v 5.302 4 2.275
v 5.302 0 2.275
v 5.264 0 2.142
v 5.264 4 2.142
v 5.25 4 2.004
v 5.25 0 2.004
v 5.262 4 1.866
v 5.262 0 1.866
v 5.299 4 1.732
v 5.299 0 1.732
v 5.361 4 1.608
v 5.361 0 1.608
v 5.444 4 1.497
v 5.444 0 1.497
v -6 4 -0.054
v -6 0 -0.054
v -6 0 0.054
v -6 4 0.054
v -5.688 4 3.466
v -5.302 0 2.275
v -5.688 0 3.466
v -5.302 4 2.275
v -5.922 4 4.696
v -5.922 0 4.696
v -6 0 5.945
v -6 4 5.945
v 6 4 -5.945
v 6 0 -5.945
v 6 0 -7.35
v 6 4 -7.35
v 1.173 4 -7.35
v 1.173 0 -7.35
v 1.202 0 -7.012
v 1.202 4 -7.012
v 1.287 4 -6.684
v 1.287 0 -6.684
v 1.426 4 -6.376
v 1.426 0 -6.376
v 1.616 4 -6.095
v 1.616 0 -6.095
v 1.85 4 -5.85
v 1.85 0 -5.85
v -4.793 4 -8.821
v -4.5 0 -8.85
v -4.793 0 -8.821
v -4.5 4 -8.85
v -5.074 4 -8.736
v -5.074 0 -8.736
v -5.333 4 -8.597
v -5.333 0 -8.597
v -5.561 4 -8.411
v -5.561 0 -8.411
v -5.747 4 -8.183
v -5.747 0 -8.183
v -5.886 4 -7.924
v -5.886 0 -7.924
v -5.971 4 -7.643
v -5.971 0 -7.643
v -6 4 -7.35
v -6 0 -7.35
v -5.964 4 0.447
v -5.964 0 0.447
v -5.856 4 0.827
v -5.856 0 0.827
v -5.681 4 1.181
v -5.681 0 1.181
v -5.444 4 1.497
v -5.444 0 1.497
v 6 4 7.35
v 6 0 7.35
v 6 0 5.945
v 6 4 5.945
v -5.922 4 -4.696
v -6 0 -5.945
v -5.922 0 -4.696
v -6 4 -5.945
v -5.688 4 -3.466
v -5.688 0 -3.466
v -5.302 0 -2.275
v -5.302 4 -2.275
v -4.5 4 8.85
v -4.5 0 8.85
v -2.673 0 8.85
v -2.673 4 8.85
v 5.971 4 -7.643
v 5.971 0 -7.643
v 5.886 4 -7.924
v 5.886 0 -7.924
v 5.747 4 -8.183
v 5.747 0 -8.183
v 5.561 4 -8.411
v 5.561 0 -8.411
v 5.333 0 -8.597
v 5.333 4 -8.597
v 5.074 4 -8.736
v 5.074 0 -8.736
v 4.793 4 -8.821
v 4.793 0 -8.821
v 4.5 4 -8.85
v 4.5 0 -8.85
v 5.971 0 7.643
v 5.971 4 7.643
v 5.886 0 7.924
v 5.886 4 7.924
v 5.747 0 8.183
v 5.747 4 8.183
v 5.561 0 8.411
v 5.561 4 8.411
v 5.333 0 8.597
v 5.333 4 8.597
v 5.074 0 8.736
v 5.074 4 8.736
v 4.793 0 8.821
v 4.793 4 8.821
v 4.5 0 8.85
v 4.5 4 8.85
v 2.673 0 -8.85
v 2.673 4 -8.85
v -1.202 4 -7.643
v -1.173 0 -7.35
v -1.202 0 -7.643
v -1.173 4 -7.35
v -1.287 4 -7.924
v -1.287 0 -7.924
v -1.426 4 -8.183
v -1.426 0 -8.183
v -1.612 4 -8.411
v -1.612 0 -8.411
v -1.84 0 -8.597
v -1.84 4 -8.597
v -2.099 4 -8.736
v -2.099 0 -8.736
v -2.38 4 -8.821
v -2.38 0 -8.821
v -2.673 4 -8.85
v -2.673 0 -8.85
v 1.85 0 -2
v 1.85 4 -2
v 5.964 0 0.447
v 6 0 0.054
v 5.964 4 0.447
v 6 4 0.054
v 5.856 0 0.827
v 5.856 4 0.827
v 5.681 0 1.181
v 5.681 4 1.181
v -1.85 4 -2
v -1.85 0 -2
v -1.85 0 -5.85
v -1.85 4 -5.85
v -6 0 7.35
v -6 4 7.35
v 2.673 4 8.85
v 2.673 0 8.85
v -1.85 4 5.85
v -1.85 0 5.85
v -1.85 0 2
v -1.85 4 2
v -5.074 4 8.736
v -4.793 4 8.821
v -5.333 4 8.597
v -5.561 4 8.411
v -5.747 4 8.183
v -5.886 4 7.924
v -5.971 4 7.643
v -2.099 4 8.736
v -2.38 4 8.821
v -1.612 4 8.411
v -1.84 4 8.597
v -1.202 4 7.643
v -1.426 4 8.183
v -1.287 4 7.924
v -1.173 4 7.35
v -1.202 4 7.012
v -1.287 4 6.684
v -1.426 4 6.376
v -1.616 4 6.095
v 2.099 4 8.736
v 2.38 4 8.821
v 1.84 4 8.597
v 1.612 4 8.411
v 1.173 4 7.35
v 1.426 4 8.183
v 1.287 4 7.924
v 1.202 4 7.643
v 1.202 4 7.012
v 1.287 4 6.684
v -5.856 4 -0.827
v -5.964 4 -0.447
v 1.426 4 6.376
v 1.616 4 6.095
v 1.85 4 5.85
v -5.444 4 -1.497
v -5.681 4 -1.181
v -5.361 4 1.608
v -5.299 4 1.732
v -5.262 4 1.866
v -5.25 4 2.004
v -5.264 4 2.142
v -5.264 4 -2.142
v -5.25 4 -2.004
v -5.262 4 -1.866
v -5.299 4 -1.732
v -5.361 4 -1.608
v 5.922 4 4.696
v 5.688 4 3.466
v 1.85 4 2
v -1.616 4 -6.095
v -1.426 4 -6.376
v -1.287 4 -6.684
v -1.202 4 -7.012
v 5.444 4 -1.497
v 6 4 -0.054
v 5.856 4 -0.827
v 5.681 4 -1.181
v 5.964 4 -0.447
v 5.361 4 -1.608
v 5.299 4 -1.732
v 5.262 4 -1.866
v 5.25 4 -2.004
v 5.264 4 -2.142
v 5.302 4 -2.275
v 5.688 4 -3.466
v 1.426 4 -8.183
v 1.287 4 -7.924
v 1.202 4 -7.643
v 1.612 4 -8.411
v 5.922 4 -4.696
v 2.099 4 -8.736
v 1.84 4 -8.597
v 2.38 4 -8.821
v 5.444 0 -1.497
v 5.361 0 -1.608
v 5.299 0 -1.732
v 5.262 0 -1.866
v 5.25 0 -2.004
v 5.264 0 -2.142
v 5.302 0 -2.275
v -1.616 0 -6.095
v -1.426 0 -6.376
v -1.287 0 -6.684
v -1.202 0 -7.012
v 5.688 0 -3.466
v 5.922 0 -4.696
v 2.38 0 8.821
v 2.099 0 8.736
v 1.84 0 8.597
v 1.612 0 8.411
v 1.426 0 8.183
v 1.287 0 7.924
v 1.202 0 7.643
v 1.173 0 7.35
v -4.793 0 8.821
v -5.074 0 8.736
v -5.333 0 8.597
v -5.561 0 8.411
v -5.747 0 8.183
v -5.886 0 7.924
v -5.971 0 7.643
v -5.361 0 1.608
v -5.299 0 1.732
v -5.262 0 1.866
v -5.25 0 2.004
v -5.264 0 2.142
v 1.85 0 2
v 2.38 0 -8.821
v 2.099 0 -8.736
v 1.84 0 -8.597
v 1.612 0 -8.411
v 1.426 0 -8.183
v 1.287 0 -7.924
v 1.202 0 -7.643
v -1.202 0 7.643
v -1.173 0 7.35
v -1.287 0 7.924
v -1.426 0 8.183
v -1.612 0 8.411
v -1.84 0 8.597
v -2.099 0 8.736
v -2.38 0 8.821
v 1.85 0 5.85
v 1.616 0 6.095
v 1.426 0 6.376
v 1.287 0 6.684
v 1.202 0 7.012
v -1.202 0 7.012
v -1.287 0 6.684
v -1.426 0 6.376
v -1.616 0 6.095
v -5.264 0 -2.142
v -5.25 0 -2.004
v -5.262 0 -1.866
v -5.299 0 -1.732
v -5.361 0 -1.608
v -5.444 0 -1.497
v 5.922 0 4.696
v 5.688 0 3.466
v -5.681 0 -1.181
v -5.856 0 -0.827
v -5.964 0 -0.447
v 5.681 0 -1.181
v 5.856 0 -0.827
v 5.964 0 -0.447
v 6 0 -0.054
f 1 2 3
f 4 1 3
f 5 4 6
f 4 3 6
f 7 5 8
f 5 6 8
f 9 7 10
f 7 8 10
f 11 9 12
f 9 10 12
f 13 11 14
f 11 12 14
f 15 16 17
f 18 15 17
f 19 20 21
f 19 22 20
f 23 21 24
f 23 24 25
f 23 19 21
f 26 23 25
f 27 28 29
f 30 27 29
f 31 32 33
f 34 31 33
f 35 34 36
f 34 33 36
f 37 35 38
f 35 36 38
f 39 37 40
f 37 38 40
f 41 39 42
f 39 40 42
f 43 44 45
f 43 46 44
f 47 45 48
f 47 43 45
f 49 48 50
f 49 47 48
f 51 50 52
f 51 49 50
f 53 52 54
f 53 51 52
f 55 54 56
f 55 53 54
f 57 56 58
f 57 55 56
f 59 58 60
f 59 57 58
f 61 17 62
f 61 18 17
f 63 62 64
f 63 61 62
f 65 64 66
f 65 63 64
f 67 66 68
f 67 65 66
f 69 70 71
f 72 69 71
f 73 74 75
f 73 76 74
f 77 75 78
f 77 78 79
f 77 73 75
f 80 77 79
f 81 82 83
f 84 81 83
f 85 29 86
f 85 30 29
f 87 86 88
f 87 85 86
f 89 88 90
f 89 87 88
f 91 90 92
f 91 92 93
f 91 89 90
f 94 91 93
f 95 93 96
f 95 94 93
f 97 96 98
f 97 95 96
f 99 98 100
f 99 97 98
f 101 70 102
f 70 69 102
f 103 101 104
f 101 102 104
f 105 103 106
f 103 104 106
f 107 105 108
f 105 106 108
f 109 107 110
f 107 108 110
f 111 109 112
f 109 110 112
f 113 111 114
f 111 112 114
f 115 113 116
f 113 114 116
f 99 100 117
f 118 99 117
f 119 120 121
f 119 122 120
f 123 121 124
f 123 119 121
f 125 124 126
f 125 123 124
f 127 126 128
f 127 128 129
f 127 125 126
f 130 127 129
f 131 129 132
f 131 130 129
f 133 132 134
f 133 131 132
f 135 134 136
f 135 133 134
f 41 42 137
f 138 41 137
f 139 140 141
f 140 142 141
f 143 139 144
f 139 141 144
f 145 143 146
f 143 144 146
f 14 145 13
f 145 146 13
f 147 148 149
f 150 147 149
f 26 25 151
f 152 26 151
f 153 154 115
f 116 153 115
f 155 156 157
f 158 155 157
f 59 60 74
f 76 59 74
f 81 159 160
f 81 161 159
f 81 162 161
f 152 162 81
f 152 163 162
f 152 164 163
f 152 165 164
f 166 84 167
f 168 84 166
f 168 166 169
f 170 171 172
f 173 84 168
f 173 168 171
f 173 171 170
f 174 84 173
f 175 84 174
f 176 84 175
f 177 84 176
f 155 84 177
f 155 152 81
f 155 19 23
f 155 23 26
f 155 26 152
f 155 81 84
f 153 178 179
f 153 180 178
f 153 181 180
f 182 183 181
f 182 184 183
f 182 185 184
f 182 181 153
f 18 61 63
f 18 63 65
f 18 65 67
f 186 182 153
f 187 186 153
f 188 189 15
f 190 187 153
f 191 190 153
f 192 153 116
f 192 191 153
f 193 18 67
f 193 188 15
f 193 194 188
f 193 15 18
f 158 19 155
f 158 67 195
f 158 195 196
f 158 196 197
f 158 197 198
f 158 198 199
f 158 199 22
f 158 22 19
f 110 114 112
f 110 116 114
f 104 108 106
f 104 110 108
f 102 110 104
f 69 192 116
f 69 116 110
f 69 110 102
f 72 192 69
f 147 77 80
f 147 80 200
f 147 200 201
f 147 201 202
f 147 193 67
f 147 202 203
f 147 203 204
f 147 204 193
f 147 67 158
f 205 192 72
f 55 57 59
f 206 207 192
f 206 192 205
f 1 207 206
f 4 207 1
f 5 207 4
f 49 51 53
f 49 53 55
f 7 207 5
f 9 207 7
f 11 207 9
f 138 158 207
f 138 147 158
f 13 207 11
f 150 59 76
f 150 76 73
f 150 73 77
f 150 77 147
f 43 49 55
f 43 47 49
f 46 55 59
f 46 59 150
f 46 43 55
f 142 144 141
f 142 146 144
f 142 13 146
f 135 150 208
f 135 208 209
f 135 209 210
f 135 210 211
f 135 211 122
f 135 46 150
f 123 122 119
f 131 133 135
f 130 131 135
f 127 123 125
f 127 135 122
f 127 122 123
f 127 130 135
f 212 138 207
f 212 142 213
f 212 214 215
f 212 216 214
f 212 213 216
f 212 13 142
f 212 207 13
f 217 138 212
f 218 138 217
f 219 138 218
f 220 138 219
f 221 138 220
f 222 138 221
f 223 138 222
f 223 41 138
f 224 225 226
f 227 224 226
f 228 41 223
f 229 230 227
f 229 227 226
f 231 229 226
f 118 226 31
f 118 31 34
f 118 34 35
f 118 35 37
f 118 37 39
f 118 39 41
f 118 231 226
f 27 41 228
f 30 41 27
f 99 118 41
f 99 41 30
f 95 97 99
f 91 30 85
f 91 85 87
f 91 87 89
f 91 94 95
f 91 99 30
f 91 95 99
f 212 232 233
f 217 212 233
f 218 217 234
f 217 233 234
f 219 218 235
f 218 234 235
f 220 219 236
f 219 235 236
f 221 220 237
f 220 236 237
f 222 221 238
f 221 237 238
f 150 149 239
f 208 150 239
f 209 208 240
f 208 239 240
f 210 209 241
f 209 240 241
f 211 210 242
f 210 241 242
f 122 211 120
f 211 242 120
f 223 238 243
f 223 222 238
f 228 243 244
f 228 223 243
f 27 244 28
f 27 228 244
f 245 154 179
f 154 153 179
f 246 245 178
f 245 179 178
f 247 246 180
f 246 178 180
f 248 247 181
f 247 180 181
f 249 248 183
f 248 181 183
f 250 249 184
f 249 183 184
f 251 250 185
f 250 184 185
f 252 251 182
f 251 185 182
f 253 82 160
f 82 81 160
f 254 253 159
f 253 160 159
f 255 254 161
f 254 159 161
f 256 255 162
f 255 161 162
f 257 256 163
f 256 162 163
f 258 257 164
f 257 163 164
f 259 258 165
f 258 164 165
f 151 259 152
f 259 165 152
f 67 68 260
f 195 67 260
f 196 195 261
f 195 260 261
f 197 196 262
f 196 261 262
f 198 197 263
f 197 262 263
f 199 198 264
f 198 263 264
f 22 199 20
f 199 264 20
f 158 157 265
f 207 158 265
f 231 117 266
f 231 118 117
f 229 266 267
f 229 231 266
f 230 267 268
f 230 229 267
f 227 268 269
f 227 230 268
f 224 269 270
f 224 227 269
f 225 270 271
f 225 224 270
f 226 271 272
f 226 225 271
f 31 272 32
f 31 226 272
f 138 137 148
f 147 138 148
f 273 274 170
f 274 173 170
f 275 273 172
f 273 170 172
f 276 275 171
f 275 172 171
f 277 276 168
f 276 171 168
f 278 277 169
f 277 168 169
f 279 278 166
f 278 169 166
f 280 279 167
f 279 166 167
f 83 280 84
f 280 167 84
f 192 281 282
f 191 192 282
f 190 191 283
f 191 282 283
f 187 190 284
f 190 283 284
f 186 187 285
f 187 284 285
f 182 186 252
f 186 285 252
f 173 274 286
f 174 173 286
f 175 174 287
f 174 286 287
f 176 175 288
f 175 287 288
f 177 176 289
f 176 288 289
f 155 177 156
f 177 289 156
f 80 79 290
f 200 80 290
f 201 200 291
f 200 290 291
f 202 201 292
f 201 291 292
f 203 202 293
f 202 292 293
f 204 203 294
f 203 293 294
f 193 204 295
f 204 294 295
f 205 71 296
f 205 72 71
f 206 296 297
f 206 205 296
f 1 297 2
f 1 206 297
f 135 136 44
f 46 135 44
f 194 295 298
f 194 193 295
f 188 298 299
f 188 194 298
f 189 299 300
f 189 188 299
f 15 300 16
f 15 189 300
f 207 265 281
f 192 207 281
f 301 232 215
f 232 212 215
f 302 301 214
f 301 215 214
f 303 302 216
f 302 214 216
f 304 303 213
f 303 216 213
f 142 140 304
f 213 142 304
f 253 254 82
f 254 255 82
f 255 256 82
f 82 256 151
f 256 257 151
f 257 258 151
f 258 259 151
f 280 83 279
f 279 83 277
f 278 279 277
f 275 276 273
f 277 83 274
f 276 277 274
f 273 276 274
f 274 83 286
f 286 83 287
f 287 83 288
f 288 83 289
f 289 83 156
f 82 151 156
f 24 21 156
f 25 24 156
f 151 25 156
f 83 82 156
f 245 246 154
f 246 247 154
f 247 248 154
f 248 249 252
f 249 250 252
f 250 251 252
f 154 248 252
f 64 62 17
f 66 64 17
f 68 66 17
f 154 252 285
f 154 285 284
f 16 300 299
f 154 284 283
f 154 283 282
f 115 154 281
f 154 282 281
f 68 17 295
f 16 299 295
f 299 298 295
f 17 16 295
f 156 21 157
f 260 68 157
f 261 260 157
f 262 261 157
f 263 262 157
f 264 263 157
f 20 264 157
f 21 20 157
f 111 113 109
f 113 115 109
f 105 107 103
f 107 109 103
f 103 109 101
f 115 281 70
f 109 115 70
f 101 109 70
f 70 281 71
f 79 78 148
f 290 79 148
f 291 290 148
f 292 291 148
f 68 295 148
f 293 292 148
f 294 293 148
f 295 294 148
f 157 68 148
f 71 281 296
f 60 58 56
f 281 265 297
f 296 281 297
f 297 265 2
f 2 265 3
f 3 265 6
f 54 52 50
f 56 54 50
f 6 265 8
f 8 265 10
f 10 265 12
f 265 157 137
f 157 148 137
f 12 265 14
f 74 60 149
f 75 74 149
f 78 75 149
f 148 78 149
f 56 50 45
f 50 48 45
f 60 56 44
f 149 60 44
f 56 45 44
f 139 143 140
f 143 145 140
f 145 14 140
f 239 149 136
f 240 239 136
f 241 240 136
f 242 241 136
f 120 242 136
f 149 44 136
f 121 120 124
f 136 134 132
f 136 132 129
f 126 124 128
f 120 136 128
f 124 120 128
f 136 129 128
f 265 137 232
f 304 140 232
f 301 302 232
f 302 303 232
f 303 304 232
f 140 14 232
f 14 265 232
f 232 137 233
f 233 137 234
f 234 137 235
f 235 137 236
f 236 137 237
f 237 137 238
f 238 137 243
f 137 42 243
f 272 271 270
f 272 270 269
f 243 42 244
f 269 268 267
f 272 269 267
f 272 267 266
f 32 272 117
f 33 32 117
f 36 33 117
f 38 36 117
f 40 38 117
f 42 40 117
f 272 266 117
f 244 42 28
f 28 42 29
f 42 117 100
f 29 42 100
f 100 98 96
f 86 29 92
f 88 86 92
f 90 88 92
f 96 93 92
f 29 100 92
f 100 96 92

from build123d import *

# Parameters (mm, degrees)
BOSS_EXTRUDE2_DEPTH = 4
FILLET1_R           = 10
FILLET2_R           = 2.15
FILLET3_R           = 1.5


with BuildPart() as part:
    # Sketch1 → Boss-Extrude2 (new body)
    with BuildSketch(Plane(origin=(0, 0, 0), x_dir=(1, 0, 0), z_dir=(0, 1, 0))):
        with BuildLine():
            Line((6, -1.25), (6, 1.25))
            ThreePointArc((6, 1.25), (5.25, 2), (6, 2.75))
            Line((6, 2.75), (6, 8.85))
            Line((6, 8.85), (1.85, 8.85))
            ThreePointArc((1.85, 8.85), (1.172875656, 7.35), (1.85, 5.85))
            Line((1.85, 5.85), (1.85, 2))
            Line((1.85, 2), (-1.85, 2))
            Line((-1.85, 2), (-1.85, 5.85))
            ThreePointArc((-1.85, 5.85), (-1.172875656, 7.35), (-1.85, 8.85))
            Line((-1.85, 8.85), (-6, 8.85))
            Line((-6, 8.85), (-6, 2.75))
            ThreePointArc((-6, 2.75), (-5.25, 2), (-6, 1.25))
            Line((-6, 1.25), (-6, -1.25))
            ThreePointArc((-6, -1.25), (-5.25, -2), (-6, -2.75))
            Line((-6, -2.75), (-6, -8.85))
            Line((-6, -8.85), (-1.85, -8.85))
            ThreePointArc((-1.85, -8.85), (-1.172875656, -7.35), (-1.85, -5.85))
            Line((-1.85, -5.85), (-1.85, -2))
            Line((-1.85, -2), (1.85, -2))
            Line((1.85, -2), (1.85, -5.85))
            ThreePointArc((1.85, -5.85), (1.172875656, -7.35), (1.85, -8.85))
            Line((1.85, -8.85), (6, -8.85))
            Line((6, -8.85), (6, -2.75))
            ThreePointArc((6, -2.75), (5.25, -2), (6, -1.25))
        make_face()
    extrude(amount=BOSS_EXTRUDE2_DEPTH)

    # Fillet1
    fillet1_edges = [part.edges().sort_by_distance(p)[0] for p in [
        (-6, 2, 2.75),
        (-6, 2, -2.75),
        (6, 2, -2.75),
        (6, 2, 2.75),
    ]]
    fillet(fillet1_edges, radius=FILLET1_R)

    # Fillet2
    fillet2_edges = [part.edges().sort_by_distance(p)[0] for p in [
        (-6, 2, 1.25),
        (-6, 2, -1.25),
        (6, 2, -1.25),
        (6, 2, 1.25),
    ]]
    fillet(fillet2_edges, radius=FILLET2_R)

    # Fillet3
    fillet3_edges = [part.edges().sort_by_distance(p)[0] for p in [
        (-1.85, 2, 8.85),
        (-6, 2, 8.85),
        (-6, 2, -8.85),
        (-1.85, 2, -8.85),
        (1.85, 2, -8.85),
        (6, 2, -8.85),
        (6, 2, 8.85),
        (1.85, 2, 8.85),
    ]]
    fillet(fillet3_edges, radius=FILLET3_R)


solid = part.part
